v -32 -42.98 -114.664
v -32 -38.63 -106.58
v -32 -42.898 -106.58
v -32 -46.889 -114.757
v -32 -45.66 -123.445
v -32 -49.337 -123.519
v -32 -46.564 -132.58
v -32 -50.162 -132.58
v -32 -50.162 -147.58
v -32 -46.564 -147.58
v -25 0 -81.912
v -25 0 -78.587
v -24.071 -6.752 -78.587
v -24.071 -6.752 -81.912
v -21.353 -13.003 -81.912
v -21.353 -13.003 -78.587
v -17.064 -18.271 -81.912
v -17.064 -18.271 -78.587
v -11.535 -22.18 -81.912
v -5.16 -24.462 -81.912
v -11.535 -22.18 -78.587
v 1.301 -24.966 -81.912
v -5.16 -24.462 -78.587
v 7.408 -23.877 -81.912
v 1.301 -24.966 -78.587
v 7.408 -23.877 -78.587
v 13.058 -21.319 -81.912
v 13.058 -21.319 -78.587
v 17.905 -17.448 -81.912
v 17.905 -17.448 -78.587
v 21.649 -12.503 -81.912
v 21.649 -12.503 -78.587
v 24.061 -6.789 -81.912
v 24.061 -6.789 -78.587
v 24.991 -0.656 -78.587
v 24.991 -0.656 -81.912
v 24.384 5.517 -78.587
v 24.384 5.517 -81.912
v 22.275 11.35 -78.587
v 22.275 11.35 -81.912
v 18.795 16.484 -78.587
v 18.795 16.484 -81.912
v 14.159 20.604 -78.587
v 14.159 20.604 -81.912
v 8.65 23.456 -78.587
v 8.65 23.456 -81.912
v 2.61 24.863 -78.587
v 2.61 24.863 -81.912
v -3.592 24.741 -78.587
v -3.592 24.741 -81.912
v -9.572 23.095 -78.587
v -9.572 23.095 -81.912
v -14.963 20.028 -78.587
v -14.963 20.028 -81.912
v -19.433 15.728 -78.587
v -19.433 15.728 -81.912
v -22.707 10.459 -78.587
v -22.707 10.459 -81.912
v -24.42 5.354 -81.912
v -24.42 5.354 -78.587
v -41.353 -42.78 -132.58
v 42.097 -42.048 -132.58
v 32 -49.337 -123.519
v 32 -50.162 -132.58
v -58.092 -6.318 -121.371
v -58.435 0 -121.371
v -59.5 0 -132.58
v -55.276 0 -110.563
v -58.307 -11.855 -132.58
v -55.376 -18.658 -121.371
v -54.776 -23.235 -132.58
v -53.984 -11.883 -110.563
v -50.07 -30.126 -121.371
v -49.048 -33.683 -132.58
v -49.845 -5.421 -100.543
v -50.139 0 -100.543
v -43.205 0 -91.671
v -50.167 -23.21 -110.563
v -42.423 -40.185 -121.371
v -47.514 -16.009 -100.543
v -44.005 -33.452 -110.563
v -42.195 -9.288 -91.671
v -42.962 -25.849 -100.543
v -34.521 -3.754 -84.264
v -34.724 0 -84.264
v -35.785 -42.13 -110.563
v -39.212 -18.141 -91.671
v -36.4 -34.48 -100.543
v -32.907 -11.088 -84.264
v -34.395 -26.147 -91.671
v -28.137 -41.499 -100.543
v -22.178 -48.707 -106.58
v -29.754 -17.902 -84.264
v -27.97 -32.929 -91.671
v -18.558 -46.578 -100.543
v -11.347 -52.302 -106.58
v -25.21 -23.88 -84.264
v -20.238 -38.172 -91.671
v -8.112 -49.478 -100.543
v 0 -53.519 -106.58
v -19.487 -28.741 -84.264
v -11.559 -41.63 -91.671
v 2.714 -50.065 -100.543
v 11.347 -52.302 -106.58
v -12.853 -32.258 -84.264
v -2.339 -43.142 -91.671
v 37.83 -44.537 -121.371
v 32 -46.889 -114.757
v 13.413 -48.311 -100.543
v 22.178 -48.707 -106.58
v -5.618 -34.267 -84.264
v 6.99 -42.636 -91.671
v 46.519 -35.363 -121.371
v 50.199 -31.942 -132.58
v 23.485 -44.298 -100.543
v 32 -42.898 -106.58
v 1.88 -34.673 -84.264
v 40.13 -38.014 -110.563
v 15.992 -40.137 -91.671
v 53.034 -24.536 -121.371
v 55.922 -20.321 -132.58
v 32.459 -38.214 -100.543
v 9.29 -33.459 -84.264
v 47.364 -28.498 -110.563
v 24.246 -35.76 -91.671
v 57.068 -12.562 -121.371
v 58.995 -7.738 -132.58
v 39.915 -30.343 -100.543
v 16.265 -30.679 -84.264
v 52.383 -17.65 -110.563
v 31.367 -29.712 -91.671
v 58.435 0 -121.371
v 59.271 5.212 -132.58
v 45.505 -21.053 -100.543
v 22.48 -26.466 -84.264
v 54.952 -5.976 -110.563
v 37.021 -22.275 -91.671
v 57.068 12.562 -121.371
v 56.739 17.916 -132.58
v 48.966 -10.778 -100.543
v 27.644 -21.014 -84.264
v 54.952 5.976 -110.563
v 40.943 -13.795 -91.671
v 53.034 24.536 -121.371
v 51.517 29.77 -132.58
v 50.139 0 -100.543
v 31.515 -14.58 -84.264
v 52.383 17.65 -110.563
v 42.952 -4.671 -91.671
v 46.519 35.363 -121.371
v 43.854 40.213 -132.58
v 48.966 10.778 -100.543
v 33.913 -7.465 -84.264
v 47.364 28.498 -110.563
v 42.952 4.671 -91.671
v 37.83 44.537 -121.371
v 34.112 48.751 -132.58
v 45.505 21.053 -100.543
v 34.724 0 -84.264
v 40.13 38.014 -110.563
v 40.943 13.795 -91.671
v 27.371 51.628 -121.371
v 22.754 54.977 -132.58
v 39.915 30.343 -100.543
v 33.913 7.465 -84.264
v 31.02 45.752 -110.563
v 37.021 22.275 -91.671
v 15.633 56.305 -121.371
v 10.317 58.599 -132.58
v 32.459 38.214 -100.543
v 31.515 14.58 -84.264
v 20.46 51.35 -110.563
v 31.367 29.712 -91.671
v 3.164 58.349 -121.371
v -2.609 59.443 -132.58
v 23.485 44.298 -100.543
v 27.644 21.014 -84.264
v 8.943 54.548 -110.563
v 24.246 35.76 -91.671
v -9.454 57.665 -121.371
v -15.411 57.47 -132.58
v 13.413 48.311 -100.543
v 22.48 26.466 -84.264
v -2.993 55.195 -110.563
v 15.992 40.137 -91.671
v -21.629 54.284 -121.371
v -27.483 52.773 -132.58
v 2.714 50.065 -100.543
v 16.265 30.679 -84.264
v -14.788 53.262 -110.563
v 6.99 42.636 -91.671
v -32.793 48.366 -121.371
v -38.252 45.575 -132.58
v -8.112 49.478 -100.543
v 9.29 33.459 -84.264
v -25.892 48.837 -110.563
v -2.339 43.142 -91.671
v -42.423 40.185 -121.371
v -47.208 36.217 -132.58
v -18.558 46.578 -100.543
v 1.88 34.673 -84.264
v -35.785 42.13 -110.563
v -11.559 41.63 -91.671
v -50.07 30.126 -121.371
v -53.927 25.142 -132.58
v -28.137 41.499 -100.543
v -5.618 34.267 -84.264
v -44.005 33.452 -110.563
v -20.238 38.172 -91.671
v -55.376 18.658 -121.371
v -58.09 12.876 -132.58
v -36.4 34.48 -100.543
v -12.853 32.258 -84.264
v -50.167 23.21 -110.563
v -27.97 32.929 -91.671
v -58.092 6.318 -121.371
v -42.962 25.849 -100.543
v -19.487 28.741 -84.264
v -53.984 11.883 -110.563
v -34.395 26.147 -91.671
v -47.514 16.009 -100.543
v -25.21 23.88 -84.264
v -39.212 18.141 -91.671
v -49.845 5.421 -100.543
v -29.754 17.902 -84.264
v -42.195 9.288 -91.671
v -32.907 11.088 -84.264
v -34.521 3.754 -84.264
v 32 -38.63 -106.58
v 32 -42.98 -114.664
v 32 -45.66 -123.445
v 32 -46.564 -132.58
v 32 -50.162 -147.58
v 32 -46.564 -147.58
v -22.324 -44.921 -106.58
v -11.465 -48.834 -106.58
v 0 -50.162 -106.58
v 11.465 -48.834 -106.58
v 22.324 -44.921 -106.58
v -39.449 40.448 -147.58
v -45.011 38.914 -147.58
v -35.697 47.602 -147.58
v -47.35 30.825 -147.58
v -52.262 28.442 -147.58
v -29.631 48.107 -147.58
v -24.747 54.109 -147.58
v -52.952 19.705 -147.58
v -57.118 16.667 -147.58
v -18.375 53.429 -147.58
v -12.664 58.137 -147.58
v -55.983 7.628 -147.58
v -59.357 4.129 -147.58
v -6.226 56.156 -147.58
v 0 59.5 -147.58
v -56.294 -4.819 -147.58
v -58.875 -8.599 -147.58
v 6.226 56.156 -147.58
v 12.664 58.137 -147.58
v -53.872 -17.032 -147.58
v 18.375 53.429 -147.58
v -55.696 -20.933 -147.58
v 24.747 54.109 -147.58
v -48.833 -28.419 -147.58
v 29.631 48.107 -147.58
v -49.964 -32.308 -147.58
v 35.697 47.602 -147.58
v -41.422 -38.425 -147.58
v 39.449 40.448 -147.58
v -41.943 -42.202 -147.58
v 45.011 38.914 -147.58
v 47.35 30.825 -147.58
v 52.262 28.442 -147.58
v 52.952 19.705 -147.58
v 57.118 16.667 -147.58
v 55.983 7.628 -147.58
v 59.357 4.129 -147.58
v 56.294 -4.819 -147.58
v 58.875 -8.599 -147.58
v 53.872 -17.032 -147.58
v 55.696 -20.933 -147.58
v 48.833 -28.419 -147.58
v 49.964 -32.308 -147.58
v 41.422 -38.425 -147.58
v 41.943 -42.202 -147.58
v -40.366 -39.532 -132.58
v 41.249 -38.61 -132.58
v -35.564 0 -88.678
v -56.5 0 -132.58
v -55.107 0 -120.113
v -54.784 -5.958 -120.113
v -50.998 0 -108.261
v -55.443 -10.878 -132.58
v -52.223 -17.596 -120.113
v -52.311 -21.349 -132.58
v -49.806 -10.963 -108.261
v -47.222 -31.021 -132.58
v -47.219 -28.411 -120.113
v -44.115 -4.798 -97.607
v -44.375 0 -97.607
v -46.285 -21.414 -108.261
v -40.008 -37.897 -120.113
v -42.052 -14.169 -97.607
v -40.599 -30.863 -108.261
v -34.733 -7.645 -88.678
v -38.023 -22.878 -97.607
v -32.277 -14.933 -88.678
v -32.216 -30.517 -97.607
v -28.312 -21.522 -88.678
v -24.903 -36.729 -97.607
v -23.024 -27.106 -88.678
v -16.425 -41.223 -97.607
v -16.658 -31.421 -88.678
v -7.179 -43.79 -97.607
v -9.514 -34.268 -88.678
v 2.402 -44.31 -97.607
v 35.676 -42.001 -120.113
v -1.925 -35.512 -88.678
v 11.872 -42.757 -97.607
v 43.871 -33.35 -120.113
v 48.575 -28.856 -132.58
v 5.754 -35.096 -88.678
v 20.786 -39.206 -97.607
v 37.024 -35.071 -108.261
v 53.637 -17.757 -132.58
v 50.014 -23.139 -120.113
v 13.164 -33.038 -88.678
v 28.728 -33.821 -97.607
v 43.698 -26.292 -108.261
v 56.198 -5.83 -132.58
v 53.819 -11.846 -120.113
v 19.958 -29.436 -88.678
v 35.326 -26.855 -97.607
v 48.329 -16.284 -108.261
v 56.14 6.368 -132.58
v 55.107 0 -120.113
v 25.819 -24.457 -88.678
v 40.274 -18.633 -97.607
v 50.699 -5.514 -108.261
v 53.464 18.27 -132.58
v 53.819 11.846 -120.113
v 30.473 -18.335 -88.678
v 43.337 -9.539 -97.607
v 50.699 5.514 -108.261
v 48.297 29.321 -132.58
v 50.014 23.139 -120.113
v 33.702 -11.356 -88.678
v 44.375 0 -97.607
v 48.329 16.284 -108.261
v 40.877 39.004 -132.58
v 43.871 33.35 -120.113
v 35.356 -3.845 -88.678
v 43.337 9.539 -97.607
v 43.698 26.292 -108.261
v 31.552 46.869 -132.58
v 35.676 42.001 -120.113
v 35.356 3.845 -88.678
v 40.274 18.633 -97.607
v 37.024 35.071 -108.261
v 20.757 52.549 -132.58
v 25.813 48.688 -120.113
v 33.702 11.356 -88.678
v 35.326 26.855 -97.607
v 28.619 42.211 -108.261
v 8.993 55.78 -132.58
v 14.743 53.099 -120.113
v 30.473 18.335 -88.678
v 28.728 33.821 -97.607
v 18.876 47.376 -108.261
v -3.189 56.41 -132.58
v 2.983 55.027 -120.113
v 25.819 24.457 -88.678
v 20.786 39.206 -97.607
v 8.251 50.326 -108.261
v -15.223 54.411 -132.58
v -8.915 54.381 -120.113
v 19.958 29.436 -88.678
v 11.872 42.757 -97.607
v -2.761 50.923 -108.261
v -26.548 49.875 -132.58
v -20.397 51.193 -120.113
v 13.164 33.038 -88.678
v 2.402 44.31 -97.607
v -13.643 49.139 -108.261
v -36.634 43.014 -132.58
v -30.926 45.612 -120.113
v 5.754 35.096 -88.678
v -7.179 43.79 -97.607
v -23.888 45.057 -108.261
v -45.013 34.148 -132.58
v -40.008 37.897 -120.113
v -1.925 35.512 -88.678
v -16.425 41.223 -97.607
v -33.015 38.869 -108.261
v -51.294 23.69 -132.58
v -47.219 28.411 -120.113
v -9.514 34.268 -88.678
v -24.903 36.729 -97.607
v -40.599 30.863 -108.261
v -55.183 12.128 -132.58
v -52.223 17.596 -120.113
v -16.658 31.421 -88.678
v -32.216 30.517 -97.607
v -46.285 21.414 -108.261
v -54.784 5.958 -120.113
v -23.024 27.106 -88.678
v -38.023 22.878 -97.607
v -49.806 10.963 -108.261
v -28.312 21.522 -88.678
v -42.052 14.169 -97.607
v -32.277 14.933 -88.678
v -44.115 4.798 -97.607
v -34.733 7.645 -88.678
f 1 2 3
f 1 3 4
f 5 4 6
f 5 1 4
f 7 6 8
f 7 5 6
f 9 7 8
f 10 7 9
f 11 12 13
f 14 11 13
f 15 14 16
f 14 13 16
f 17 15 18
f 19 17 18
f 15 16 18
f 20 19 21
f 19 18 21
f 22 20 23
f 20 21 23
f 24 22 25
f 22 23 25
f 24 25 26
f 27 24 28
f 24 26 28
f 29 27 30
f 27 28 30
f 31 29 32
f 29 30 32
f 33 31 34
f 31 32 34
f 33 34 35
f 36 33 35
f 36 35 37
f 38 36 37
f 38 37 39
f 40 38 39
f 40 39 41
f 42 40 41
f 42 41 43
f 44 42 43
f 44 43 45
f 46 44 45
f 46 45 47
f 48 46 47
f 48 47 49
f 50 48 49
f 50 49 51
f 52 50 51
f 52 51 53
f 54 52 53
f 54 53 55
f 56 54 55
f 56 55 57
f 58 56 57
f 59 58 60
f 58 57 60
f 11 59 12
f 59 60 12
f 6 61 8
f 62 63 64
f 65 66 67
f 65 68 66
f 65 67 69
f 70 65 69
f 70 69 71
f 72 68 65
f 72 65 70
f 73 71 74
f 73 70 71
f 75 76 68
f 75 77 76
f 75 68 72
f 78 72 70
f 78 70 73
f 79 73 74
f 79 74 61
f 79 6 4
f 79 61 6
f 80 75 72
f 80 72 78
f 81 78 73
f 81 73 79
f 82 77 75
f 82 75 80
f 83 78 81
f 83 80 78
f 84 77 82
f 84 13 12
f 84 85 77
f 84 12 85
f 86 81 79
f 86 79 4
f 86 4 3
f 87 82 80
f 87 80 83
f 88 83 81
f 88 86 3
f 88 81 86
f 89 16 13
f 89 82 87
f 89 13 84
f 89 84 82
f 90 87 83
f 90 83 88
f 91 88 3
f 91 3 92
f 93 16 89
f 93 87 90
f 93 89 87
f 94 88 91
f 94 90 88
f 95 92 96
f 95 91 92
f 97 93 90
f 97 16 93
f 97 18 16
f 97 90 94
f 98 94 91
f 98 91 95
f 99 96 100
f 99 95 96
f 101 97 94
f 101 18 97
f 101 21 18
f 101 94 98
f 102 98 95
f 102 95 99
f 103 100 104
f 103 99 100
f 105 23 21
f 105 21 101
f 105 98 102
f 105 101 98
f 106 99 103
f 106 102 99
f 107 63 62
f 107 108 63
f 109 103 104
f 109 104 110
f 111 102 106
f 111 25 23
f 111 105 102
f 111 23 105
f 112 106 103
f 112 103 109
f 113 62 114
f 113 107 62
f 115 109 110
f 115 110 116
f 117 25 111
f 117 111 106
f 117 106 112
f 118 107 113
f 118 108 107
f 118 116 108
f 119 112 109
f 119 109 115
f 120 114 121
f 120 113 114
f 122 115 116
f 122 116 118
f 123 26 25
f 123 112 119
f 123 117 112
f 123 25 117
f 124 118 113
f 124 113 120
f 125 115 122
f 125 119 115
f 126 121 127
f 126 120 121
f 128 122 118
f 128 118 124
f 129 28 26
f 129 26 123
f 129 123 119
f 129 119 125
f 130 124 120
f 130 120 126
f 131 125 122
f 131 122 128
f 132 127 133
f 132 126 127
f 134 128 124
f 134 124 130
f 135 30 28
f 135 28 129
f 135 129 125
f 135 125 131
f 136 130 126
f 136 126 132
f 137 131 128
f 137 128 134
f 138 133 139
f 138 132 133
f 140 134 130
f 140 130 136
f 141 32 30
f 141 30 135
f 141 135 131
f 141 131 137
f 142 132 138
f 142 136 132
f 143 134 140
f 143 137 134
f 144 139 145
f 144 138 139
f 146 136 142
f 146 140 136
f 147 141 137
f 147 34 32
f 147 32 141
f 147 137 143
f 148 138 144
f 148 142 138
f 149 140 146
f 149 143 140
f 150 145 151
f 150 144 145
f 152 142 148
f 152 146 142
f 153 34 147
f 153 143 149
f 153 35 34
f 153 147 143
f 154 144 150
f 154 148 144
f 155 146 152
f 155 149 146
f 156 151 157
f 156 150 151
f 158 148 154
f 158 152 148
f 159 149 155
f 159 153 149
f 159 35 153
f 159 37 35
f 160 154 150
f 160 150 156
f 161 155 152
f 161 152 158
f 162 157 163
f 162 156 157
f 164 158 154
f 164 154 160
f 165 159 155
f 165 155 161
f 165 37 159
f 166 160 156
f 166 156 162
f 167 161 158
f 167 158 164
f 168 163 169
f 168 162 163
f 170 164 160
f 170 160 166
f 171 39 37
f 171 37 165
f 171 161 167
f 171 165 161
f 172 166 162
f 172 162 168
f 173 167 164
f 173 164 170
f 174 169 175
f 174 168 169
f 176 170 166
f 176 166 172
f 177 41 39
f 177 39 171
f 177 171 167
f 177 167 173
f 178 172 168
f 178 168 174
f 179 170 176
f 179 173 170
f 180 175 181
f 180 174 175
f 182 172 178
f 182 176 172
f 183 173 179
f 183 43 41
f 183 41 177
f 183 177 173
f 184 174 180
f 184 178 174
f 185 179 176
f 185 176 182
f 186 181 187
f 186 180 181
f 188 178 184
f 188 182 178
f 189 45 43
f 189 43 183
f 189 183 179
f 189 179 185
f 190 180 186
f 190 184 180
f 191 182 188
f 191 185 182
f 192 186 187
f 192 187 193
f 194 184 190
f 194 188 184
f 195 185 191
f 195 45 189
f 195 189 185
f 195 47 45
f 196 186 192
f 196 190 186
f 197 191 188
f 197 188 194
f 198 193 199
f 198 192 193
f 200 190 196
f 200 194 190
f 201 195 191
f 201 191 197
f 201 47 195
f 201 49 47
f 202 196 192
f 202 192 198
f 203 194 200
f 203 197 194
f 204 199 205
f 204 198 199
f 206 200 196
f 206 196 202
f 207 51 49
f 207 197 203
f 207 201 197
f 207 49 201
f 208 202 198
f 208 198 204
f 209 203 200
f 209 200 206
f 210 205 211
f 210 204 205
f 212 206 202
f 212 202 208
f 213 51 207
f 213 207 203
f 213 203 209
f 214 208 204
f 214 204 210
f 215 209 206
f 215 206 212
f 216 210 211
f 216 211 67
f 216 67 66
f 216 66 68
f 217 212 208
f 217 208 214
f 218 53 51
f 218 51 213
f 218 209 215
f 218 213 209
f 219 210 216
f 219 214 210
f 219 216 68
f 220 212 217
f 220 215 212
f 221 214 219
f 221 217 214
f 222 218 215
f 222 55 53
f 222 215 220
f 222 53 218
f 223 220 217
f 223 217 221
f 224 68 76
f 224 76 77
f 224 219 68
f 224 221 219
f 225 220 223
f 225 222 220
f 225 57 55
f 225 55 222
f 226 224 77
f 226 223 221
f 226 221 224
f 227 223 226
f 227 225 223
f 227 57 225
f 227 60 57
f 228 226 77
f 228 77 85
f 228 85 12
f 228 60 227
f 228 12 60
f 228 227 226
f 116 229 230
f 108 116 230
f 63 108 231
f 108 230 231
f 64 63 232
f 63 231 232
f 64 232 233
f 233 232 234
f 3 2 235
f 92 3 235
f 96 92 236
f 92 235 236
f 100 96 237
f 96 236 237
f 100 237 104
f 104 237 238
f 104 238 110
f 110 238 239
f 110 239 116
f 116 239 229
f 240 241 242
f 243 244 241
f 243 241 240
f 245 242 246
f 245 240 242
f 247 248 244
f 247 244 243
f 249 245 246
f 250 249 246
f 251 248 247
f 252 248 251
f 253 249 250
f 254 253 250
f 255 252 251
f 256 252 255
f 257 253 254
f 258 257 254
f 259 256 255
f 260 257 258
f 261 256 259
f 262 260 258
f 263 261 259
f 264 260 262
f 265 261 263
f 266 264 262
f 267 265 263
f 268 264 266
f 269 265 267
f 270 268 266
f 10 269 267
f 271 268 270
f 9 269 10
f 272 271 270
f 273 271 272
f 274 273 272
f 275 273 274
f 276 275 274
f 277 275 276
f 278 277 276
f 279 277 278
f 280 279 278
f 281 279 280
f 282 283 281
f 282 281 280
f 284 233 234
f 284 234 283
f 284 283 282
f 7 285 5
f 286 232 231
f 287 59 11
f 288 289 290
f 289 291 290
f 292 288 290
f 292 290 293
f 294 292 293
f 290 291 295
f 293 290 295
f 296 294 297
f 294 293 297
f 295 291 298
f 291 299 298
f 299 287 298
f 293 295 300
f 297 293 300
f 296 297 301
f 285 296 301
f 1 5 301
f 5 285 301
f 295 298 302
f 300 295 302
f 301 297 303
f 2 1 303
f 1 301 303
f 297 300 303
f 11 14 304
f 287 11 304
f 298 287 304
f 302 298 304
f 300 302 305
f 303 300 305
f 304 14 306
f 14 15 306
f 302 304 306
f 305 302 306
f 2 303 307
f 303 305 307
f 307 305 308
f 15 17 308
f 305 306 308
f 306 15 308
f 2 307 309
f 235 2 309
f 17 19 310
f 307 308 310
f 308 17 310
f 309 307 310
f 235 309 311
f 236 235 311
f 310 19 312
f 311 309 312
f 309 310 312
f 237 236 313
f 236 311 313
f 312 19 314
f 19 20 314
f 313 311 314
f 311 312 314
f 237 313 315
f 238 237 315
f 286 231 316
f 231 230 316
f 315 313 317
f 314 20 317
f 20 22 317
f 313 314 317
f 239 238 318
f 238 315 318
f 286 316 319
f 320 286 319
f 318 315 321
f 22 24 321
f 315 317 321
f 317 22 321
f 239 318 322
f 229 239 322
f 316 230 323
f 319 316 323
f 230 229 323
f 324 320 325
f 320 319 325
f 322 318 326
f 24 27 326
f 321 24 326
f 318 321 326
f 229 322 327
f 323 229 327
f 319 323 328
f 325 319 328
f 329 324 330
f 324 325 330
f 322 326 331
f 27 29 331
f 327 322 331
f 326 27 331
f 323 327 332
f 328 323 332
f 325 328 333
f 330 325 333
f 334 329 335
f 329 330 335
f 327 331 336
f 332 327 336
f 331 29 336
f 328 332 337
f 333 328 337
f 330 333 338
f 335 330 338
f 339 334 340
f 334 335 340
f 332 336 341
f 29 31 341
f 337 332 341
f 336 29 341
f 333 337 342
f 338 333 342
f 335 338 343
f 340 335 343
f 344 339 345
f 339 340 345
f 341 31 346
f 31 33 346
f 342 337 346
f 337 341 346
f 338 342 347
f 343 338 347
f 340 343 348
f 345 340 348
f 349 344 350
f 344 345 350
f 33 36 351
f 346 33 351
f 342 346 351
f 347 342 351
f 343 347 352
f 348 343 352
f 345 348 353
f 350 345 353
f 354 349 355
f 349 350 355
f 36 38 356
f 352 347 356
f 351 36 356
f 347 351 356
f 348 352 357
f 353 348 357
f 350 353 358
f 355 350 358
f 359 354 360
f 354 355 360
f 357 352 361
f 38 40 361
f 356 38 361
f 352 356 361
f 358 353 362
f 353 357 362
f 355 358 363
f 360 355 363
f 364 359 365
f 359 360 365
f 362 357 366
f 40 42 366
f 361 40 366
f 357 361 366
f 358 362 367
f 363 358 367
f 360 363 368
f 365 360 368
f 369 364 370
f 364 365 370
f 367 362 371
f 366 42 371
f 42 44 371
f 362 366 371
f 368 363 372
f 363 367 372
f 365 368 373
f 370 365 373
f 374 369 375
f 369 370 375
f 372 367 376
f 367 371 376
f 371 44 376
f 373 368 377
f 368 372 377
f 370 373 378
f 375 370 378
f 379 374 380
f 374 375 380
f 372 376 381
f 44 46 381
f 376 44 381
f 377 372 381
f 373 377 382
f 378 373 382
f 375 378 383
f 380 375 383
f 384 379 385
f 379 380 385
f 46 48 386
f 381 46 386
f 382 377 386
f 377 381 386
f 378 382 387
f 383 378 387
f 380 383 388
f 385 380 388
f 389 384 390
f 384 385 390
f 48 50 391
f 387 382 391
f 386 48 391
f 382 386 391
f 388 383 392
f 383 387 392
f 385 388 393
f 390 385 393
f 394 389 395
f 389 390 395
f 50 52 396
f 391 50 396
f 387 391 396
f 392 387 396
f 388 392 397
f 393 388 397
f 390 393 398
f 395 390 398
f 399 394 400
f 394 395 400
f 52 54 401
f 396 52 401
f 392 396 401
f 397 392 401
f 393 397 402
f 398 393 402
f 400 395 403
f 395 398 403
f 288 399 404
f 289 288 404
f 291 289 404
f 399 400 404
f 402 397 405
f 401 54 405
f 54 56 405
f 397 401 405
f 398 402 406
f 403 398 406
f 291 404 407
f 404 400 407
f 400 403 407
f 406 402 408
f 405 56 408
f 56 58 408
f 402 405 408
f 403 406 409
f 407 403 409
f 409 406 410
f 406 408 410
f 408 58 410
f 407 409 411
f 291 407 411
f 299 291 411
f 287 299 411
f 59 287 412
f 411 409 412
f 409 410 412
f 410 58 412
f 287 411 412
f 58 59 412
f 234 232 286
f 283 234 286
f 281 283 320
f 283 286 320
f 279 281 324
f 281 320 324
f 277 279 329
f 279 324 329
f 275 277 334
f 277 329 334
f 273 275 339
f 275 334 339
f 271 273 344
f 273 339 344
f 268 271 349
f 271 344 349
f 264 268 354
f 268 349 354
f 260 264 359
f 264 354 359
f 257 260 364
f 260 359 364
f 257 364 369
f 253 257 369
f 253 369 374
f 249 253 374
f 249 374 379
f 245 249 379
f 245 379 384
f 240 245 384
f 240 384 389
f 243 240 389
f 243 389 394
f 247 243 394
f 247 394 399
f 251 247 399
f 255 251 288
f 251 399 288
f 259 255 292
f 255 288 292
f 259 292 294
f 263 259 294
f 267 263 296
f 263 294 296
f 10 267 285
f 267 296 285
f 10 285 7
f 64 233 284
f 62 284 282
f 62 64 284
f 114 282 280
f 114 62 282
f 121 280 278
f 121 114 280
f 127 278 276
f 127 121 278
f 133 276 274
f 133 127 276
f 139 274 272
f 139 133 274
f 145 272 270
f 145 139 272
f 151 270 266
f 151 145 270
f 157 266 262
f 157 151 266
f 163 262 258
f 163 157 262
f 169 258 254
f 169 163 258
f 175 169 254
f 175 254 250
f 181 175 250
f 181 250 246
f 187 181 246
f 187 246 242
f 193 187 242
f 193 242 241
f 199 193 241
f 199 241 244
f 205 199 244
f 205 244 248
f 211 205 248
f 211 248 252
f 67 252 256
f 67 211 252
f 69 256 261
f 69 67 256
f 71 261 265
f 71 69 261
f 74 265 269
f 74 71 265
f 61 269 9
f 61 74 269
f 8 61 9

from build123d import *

# Parameters (mm, degrees)
SHELL1_T           = 3
SKETCH5_R          = 25
CUT_EXTRUDE3_DEPTH = 170.883652636
SKETCH6_W          = 64
SKETCH6_H          = 41
CUT_EXTRUDE4_DEPTH = 170.883652636


with BuildPart() as part:
    # Sketch2 → Revolve1 (revolve)
    with BuildSketch(Plane(origin=(0, 0, 0), x_dir=(0, 0, -1), z_dir=(1, 0, 0)), mode=Mode.PRIVATE) as revolve1_sk:
        with BuildLine():
            Line((76.080335522, 0), (147.580335522, 0))
            Line((147.580335522, 0), (147.580335522, 56.5))
            Line((147.580335522, 56.5), (132.580335522, 56.5))
            ThreePointArc((132.580335522, 56.5), (92.628802385, 39.951533137), (76.080335522, 0))
        make_face()
    revolve(revolve1_sk.sketch.rotate(Axis((0, 0, -76.080335522), (0, 0, 1)), 90), axis=Axis((0, 0, -76.080335522), (0, 0, 1)))

    # Shell1
    shell1_openings = [part.faces().sort_by_distance(p)[0] for p in [
        (0, 0, -147.580335522),
    ]]
    offset(amount=SHELL1_T, openings=shell1_openings, kind=Kind.INTERSECTION)

    # Sketch5 → Cut-Extrude3 (cut, through all)
    with BuildSketch(Plane.XY):
        with Locations(Location((0, 0, 0), (0, 0, 180))):
            Circle(SKETCH5_R)
    extrude(amount=-CUT_EXTRUDE3_DEPTH, mode=Mode.SUBTRACT)

    # Sketch6 → Cut-Extrude4 (cut, through all)
    with BuildSketch(Plane(origin=(0, 0, 0), x_dir=(1, 0, 0), z_dir=(0, 1, 0))):
        with Locations((0, 127.080335522)):
            Rectangle(SKETCH6_W, SKETCH6_H)
    extrude(amount=-CUT_EXTRUDE4_DEPTH, mode=Mode.SUBTRACT)


solid = part.part
